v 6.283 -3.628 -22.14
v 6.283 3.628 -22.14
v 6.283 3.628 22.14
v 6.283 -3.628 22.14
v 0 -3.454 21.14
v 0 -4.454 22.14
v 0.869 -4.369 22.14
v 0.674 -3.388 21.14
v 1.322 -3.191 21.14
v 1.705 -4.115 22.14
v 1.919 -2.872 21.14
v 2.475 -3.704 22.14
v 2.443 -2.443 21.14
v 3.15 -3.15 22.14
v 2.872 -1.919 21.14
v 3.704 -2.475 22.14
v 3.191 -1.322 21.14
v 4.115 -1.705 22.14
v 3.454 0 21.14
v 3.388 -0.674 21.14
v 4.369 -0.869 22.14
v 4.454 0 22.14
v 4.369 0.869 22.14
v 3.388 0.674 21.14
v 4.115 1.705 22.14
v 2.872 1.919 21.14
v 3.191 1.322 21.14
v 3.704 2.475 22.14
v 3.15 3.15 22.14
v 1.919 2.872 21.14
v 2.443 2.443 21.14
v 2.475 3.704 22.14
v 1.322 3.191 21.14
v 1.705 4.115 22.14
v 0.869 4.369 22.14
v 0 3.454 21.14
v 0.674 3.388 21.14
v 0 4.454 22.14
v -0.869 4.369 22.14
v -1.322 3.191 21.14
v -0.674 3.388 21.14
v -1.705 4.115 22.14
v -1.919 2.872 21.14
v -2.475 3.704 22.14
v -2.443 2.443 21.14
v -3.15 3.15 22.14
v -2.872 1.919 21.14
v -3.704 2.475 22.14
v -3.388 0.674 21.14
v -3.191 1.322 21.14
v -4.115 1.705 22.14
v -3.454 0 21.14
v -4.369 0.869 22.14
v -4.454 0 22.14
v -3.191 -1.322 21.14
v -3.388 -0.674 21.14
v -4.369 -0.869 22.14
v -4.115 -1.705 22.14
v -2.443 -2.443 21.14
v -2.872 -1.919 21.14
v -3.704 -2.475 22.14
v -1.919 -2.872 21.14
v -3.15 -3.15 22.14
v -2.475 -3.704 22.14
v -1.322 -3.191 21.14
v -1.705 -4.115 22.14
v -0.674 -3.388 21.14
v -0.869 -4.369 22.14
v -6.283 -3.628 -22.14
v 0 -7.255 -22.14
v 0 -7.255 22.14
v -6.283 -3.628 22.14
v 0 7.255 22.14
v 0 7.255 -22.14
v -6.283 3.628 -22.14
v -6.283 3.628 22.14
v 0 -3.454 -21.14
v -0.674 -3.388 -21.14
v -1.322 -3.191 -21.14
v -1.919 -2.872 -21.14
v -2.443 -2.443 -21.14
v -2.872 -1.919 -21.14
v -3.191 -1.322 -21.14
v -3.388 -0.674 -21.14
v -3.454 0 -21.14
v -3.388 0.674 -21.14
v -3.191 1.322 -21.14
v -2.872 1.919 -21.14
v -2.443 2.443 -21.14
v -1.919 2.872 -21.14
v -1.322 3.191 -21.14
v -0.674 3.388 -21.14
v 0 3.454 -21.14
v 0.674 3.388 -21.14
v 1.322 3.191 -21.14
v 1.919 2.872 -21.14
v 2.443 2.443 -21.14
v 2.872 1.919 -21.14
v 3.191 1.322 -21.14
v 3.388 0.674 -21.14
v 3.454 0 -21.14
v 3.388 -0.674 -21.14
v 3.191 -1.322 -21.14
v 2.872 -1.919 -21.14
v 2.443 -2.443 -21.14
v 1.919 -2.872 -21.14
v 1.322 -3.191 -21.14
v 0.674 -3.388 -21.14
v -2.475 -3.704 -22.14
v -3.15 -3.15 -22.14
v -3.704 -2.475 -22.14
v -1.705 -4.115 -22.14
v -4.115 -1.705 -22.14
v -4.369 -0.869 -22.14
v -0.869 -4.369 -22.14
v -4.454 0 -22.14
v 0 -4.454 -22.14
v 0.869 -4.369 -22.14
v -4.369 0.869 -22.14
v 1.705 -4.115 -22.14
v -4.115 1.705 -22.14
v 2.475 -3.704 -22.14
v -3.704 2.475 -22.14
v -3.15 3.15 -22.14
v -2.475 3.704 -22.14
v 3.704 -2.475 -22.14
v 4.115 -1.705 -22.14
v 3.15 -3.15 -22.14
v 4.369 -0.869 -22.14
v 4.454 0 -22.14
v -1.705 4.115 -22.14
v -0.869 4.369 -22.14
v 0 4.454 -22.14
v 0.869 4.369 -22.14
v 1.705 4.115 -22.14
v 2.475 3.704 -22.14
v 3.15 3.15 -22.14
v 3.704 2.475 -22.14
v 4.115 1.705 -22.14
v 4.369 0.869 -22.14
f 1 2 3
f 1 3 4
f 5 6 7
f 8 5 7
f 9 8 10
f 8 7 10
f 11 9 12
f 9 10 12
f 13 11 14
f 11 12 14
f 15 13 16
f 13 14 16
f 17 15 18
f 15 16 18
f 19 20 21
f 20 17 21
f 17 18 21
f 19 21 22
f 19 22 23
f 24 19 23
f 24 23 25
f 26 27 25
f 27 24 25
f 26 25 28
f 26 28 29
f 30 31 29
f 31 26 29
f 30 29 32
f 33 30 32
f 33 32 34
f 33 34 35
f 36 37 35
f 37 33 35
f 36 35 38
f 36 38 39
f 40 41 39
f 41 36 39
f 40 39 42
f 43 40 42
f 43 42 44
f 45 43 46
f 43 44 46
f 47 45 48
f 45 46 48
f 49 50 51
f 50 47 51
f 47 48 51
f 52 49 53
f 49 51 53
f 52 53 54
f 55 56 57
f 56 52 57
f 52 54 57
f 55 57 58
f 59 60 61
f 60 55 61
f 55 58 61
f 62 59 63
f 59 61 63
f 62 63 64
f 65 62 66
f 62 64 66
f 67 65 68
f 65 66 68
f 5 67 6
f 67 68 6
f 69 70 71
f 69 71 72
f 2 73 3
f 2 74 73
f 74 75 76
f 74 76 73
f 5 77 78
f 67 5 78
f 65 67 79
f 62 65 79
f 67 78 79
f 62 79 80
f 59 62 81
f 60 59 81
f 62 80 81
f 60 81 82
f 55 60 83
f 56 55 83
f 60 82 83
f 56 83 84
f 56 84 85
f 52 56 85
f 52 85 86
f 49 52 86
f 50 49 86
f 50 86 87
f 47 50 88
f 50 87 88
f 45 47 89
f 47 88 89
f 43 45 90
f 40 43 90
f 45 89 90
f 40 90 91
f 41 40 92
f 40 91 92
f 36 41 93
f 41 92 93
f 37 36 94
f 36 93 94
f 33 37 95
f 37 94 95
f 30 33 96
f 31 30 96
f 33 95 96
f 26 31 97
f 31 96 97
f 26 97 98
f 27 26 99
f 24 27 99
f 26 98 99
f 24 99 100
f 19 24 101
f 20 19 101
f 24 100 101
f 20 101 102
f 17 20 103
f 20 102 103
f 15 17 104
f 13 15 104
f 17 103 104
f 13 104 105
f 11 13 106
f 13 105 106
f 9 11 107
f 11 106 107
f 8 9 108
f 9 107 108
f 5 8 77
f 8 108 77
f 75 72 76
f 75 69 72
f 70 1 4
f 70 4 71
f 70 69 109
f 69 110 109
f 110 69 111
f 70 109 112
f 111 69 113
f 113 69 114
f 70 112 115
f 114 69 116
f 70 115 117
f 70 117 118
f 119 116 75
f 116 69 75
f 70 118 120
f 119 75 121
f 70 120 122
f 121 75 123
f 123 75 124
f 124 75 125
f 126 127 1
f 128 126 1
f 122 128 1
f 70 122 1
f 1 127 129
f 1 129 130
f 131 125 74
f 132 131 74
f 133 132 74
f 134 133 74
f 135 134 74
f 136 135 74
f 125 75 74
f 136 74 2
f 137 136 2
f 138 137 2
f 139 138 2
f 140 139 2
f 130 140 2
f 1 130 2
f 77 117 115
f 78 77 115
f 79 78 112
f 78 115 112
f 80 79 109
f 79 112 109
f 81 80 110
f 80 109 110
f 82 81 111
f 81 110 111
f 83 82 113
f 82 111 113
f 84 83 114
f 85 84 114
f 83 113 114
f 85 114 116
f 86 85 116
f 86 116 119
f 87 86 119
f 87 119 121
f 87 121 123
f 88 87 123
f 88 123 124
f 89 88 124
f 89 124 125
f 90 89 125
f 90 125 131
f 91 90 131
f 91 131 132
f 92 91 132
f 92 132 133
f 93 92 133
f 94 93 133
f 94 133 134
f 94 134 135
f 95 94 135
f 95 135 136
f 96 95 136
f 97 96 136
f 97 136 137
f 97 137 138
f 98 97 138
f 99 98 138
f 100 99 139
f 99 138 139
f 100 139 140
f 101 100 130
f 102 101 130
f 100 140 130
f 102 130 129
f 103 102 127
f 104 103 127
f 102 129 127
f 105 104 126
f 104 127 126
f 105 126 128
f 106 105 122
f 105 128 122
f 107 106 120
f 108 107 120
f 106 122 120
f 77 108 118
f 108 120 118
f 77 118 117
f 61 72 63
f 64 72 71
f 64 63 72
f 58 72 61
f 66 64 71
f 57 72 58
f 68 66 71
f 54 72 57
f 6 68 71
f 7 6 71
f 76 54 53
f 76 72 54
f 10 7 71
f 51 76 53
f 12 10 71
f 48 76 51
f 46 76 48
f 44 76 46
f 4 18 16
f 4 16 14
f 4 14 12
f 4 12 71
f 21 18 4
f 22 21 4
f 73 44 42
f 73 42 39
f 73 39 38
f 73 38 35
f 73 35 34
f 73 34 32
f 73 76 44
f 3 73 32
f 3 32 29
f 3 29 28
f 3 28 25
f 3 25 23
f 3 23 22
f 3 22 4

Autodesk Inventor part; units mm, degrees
ref_plane "YZ Plane" through (0, 0, 0) normal (1, 0, 0) x (0, 1, 0)
ref_plane "XZ Plane" through (0, 0, 0) normal (0, 1, 0) x (-1, 0, 0)
ref_plane "XY Plane" through (0, 0, 0) normal (0, 0, 1) x (1, 0, 0)
sketch "Sketch1" plane through (0, 0, 0) normal (0, 0, 1) x (1, 0, 0)
  circle A0 centre (0, 0) radius 7.255
  line L0 (0, -7.255) -> (-6.283, -3.6275)
  line L1 (-6.283, -3.6275) -> (-6.283, 3.6275)
  line L2 (-6.283, 3.6275) -> (0, 7.255)
  line L3 (0, 7.255) -> (6.283, 3.6275)
  line L4 (6.283, 3.6275) -> (6.283, -3.6275)
  line L5 (6.283, -3.6275) -> (0, -7.255)
  dimension "d0" = 14.51
extrude "Extrusion1" add sketch "Sketch1" along normal mid plane 44.28 contours L4 L5 L0 L1 L2 L3
sketch "Sketch2" plane through (0, 0, 22.14) normal (0, 0, 1) x (1, 0, 0)
  circle A0 centre (0, 0) radius 4.3621
hole "Hole1" at (0, 0, 22.14) direction (0, 0, -1) diameter 6.9088 end through all
chamfer "Chamfer1" distance 1 angle 45 1 edges at (0, 3.4544, 22.14)
chamfer "Chamfer2" distance 1 angle 45 1 edges at (0, 3.4544, -22.14)
properties part number "CNC- Hexagonal Bit"
